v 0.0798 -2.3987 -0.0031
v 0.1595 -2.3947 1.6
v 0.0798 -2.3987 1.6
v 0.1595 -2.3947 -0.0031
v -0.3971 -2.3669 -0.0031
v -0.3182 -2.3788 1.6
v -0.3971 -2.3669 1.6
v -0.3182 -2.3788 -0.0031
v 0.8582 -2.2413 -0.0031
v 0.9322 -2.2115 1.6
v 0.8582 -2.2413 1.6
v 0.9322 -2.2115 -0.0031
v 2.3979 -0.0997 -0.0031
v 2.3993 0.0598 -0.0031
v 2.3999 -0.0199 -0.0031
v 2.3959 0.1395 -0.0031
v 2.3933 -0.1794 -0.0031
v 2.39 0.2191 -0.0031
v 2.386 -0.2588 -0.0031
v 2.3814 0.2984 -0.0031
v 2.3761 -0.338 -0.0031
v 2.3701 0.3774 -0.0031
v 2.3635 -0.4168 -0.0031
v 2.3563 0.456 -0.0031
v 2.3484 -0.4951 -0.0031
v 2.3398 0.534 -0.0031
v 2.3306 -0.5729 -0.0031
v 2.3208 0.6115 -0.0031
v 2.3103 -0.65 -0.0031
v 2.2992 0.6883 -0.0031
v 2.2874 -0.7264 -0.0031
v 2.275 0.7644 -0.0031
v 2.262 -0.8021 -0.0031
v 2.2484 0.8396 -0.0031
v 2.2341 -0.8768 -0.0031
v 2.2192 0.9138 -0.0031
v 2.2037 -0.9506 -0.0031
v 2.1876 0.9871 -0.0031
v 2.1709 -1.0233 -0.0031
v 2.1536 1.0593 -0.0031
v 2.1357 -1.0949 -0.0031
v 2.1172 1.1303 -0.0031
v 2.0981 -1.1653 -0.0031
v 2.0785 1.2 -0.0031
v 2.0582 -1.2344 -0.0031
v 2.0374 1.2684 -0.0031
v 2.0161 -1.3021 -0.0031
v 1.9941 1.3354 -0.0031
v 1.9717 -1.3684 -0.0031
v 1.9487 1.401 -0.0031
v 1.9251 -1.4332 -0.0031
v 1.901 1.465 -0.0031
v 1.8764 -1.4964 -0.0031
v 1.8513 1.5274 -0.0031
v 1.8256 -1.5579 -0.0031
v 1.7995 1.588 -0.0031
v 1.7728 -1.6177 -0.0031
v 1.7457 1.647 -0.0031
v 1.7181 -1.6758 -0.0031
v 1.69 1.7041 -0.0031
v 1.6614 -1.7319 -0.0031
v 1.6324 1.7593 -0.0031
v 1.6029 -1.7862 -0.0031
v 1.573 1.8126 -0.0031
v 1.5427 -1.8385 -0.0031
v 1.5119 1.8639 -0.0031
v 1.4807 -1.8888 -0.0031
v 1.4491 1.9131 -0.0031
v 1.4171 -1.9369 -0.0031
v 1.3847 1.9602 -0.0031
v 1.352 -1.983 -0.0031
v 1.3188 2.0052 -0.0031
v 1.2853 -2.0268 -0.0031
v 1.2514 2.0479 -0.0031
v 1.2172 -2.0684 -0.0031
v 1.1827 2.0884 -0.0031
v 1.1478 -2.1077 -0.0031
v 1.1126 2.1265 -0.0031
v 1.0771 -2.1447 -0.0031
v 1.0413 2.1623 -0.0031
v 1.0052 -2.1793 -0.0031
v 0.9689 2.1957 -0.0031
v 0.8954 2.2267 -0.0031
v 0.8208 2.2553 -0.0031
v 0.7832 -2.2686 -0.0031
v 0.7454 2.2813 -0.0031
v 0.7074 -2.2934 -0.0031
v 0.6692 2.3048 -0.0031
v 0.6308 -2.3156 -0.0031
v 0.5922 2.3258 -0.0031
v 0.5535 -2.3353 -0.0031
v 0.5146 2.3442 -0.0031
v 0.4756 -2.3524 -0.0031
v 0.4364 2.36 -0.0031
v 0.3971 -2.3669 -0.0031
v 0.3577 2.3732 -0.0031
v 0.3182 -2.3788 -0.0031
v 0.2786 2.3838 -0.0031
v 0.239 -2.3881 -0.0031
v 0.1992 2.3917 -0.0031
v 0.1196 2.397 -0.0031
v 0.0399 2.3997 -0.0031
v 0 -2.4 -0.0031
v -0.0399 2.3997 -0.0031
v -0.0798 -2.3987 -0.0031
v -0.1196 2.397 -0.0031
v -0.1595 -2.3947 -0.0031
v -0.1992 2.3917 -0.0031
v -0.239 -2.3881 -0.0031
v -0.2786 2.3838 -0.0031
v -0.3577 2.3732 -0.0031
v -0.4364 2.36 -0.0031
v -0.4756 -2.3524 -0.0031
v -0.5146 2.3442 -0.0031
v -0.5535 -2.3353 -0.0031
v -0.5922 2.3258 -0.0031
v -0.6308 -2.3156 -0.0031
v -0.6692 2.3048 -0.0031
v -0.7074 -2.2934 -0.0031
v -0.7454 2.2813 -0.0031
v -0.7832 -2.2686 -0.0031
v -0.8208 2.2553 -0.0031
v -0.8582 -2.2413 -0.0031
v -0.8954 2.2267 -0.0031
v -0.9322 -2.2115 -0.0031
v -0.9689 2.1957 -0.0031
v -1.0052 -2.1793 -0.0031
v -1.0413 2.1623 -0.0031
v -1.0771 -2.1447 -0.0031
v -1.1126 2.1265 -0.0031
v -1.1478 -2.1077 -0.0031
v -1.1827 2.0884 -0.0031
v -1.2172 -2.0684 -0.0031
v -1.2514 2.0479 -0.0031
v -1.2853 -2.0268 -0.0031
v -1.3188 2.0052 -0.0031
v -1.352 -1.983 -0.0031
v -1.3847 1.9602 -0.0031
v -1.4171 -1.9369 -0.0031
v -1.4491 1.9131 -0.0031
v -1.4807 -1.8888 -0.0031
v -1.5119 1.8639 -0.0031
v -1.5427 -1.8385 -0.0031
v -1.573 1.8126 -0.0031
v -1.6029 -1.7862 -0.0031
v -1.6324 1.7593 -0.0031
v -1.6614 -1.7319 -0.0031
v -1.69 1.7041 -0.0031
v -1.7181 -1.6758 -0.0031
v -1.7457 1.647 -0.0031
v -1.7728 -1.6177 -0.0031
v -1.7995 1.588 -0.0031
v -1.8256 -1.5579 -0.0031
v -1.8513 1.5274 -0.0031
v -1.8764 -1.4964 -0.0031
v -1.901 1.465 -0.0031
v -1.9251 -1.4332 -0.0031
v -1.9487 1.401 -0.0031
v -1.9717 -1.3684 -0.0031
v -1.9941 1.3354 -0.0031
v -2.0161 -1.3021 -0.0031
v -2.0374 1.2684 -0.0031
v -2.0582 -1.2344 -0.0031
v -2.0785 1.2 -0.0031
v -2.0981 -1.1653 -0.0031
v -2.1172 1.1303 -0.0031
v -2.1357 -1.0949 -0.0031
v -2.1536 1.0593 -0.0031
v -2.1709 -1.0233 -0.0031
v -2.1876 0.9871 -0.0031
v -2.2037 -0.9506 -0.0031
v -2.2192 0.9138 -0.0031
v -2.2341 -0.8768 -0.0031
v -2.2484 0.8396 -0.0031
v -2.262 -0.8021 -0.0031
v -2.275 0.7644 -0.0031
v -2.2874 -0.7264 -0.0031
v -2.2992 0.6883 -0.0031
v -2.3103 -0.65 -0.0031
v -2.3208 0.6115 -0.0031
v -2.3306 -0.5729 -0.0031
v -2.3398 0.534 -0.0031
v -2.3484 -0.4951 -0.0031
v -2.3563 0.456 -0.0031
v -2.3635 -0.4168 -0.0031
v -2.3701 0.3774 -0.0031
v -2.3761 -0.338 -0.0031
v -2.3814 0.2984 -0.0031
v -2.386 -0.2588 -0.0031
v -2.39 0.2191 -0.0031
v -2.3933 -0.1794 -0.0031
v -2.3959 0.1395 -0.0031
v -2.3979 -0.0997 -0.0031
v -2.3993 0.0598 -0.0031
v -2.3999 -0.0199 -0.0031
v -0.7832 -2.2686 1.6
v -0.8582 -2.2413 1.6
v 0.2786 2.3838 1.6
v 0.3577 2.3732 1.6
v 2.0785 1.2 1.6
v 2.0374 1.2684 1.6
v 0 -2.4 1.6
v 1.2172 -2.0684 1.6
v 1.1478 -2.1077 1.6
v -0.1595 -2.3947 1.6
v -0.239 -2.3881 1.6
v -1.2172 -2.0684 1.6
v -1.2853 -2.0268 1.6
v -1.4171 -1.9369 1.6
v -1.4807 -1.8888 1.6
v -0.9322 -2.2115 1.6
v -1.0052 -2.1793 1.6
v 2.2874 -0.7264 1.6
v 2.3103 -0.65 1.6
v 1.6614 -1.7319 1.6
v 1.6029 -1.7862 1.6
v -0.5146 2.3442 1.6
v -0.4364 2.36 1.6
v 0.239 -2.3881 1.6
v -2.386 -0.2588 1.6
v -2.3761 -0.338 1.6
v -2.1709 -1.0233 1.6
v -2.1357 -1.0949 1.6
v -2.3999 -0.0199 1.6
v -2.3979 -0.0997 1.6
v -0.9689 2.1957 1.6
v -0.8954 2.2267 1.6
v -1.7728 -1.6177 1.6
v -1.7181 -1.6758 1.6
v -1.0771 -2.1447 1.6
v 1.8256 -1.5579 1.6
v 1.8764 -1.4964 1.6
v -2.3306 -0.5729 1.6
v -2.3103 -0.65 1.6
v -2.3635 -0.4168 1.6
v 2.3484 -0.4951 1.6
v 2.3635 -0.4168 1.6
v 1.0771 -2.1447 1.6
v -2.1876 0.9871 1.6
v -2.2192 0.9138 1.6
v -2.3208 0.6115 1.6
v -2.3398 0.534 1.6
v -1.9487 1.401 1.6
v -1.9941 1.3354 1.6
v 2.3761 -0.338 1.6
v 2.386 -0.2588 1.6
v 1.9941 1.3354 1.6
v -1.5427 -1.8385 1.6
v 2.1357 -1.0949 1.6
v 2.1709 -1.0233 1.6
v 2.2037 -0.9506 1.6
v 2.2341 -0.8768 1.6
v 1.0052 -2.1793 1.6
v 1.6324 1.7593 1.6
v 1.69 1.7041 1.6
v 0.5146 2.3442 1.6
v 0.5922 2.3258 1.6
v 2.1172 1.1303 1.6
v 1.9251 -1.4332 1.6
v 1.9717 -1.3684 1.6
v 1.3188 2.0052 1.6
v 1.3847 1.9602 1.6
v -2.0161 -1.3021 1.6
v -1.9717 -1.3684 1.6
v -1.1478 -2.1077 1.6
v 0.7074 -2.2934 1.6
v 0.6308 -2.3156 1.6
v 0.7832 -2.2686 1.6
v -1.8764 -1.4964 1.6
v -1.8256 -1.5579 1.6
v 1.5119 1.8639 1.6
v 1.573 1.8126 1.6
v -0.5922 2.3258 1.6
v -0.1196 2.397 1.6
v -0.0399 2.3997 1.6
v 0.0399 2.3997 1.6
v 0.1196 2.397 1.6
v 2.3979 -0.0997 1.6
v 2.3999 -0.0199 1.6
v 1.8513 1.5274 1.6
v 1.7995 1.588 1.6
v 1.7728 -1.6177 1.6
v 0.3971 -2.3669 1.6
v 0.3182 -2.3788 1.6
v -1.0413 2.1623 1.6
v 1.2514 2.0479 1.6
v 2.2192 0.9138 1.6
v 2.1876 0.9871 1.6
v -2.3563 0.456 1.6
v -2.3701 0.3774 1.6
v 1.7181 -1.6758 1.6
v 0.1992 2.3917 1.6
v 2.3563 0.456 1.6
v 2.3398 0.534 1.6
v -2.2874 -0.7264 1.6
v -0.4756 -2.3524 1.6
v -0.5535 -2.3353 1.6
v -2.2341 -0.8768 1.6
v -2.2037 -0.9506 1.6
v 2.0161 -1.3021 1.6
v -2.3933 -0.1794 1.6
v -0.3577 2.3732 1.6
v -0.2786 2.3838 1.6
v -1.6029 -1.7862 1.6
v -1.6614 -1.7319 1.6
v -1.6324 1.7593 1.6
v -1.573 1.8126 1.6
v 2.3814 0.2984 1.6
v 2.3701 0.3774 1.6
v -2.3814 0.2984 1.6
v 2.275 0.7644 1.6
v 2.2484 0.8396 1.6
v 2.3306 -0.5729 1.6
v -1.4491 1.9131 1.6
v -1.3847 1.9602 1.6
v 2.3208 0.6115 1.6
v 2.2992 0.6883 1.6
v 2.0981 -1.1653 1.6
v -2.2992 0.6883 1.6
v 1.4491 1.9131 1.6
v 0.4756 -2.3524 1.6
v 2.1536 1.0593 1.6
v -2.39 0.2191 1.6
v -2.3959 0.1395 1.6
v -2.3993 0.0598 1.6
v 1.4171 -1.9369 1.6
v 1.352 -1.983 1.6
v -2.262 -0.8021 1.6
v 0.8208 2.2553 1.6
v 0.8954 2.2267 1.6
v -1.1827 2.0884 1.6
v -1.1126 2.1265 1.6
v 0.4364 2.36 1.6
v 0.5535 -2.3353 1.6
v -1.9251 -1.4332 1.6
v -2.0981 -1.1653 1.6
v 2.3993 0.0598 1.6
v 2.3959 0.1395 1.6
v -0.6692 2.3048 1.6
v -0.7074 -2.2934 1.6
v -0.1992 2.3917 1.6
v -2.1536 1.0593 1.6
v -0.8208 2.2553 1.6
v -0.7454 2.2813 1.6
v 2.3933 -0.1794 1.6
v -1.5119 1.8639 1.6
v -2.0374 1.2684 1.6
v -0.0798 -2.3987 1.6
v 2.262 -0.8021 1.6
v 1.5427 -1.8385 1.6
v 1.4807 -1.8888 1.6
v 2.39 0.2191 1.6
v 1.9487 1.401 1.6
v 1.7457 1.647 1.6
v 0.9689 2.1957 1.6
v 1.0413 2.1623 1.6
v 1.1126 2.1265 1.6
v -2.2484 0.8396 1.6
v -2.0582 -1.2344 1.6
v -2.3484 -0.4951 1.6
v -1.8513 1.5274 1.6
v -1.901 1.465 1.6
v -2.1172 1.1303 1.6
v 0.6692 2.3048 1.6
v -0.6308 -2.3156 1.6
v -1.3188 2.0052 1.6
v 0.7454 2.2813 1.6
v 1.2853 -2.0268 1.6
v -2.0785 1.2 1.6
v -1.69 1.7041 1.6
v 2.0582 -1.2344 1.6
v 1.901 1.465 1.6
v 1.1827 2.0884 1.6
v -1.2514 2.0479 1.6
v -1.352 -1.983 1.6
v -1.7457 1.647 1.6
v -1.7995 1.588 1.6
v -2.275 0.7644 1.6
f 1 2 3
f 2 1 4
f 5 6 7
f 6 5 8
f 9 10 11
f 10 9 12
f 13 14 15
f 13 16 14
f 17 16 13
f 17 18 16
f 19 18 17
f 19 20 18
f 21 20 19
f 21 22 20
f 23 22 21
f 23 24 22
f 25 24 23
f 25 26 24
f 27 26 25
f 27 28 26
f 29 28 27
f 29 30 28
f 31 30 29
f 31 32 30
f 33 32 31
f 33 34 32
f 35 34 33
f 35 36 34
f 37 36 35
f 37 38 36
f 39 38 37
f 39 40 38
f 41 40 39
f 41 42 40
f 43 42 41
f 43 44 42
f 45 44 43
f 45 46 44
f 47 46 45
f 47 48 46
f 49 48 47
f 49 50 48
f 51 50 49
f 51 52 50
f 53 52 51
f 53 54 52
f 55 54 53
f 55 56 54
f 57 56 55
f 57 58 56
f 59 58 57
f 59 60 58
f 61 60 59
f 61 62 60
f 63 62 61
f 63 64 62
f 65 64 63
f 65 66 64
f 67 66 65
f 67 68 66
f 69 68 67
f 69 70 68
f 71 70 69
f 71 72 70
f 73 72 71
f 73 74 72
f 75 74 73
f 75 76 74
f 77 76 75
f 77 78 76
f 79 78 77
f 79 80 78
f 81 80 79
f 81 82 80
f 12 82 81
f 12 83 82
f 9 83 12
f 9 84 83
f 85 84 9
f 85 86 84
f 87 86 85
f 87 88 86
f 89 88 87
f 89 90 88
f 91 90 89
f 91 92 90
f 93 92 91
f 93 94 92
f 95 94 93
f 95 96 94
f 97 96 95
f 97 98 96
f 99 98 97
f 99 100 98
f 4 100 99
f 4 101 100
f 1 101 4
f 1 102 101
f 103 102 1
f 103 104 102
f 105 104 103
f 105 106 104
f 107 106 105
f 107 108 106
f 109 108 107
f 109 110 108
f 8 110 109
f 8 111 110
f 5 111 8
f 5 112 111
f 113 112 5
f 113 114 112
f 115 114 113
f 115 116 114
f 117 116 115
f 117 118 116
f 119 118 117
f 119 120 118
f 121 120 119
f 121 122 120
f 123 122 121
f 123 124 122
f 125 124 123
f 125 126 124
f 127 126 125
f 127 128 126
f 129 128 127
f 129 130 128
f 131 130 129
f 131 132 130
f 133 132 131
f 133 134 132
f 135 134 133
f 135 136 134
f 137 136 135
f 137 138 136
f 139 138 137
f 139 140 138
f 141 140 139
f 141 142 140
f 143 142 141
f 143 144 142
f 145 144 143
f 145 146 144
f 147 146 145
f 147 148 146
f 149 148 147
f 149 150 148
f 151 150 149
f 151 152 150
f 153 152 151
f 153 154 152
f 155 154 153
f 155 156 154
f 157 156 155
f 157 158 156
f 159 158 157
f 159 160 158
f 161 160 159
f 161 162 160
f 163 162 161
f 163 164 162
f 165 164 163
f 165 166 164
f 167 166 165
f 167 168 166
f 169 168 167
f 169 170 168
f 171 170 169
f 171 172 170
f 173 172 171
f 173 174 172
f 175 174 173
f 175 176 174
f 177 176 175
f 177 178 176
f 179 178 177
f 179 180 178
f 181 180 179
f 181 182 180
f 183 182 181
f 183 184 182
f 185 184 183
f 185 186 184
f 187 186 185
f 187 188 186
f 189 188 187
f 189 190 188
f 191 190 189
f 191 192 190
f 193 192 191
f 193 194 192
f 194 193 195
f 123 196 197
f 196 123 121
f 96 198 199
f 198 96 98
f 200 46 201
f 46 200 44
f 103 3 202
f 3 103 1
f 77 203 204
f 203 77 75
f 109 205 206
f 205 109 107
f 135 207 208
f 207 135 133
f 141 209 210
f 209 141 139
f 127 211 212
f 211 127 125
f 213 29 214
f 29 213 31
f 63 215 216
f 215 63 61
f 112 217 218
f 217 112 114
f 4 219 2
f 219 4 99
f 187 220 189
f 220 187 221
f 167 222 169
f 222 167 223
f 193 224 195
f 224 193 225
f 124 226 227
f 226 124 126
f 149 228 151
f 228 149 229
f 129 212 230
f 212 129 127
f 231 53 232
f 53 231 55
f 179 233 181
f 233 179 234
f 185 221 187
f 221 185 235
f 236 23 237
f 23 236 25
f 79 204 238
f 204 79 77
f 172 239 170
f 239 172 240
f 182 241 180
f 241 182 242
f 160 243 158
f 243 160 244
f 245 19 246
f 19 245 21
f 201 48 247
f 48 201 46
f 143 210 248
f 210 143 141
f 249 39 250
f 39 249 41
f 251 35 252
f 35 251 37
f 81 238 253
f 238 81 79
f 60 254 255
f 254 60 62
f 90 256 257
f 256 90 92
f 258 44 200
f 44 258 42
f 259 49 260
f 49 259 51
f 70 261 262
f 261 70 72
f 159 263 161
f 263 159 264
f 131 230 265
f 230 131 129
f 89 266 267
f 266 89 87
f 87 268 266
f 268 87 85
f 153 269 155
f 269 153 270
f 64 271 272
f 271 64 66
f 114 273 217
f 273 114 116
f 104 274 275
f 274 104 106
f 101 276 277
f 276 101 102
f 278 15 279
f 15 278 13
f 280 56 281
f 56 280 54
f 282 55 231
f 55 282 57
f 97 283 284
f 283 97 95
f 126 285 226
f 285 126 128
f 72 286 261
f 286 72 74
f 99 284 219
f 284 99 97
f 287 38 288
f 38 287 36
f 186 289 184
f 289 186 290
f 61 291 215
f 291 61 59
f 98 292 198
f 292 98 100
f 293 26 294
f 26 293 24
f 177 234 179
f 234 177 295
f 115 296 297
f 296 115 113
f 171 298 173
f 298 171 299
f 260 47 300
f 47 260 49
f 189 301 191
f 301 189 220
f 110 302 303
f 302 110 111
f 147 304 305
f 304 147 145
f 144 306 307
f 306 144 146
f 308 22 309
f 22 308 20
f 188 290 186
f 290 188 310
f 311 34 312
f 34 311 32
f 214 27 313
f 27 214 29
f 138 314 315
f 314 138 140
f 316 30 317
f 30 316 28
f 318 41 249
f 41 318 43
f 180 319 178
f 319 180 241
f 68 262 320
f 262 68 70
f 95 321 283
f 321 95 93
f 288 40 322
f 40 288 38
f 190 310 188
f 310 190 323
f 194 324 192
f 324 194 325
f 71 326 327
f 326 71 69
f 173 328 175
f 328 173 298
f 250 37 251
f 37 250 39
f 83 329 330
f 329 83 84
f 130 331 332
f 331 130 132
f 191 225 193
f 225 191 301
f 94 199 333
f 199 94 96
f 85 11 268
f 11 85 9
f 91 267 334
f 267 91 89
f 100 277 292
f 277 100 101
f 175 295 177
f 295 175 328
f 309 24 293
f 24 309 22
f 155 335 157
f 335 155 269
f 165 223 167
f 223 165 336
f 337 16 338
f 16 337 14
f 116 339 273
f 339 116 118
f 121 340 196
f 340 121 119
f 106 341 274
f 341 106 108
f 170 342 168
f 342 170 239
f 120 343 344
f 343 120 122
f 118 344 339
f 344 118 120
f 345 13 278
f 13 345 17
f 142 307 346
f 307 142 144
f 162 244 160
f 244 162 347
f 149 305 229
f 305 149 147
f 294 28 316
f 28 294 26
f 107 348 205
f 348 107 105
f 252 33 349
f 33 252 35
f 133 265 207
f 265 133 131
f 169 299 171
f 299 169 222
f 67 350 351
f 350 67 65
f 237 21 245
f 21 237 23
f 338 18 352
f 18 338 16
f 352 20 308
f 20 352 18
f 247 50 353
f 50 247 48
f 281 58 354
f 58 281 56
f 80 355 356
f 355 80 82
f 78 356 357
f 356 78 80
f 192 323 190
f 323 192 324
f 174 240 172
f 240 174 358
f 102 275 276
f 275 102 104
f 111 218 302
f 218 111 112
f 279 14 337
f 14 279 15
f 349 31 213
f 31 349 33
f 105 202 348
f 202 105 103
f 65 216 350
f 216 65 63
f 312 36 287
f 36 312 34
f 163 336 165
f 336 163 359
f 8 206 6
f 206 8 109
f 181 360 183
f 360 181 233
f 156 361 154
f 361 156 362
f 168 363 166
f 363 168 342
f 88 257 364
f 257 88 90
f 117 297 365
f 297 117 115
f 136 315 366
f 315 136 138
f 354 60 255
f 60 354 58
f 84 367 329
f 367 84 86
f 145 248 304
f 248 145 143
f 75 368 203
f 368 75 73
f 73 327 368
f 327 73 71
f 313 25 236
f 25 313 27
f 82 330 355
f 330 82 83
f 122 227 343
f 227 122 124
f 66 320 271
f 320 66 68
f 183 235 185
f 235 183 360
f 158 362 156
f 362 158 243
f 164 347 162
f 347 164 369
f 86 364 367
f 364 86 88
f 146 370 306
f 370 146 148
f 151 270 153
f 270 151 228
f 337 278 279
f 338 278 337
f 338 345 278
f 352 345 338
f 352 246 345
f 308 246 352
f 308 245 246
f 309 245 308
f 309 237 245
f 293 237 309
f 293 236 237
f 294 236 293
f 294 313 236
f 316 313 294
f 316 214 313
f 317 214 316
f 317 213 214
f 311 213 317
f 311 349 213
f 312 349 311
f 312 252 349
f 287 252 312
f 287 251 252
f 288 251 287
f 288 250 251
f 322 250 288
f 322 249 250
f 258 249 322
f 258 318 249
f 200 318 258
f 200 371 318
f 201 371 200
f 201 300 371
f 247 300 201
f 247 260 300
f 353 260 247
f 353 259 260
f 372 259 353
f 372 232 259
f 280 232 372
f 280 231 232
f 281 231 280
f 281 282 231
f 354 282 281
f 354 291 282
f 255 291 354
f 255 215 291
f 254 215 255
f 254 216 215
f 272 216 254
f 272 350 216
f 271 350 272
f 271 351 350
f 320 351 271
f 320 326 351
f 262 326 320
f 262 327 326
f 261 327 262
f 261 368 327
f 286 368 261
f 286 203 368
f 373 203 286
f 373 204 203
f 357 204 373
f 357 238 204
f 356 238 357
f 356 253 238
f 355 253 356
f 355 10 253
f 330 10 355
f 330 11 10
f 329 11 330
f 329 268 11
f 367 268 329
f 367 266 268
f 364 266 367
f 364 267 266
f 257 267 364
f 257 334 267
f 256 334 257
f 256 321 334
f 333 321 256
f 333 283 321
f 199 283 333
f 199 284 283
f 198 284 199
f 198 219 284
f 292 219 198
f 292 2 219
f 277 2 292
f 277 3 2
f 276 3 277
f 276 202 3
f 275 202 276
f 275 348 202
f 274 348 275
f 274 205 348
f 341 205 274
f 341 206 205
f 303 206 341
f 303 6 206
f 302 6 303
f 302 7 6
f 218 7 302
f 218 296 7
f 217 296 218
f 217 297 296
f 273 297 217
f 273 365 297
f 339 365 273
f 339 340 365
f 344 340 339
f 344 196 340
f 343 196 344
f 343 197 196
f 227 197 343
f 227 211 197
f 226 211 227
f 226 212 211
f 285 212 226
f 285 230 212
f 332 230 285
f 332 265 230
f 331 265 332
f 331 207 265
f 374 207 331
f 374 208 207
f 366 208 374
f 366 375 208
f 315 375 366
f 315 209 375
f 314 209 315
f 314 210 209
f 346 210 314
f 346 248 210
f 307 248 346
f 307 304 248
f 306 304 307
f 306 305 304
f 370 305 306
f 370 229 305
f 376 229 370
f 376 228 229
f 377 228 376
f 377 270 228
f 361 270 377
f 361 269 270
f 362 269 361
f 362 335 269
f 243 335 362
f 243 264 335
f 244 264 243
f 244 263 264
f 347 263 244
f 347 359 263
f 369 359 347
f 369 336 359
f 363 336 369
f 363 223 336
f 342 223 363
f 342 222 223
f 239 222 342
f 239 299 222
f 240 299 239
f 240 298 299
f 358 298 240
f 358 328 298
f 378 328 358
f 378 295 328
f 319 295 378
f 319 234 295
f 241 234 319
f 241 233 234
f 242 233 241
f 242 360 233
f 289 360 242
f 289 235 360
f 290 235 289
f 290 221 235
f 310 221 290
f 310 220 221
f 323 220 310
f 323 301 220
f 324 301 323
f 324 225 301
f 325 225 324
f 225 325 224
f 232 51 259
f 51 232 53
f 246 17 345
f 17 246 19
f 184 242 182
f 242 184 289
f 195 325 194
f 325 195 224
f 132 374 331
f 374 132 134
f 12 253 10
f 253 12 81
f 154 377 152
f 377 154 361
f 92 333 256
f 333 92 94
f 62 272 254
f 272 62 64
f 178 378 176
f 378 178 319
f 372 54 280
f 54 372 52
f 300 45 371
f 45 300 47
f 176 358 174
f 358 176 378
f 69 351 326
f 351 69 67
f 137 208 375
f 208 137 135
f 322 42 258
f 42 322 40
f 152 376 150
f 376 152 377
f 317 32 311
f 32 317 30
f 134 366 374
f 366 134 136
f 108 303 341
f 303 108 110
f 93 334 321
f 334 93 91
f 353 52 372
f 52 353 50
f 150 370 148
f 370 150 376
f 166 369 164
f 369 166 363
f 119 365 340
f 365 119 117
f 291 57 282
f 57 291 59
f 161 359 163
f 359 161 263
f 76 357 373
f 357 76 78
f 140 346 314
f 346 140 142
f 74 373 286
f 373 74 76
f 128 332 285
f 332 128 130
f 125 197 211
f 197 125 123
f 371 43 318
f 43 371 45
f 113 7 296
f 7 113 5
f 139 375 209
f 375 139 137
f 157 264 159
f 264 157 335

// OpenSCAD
use <../lib.scad>
use <../p/4-4disc.scad>
use <s/4728s02.scad>
use <../p/stud.scad>
$fa=1; $fs=0.2;
function ldraw_lib__98262(realsolid=false) = [
// 0 Plant Flower  2 x  2 with Solid Stud
// 0 Name: 98262.dat
// 0 Author: Sylvain Sauvage [SLS]
// 0 !LDRAW_ORG Part UPDATE 2017-01
// 0 !LICENSE Licensed under CC BY 2.0 and CC BY 4.0 : see CAreadme.txt
// 
// 0 BFC CERTIFY CCW
  [0,"BFC","CERTIFY"],
  [0,"BFC","CCW"],
// 
// 0 !HISTORY 2017-12-30 [PTadmin] Official Update 2017-01
// 
// 
// 1 16 0 0 0 1 0 0 0 1 0 0 0 1 s\4728s02.dat
  [1,16,0,0,0,1,0,0,0,1,0,0,0,1, ldraw_lib__s__4728s02(realsolid)],
// 1 16 0 0 0 1 0 0 0 1 0 0 0 1 stud.dat
  [1,16,0,0,0,1,0,0,0,1,0,0,0,1, ldraw_lib__stud(realsolid)],
// 1 16 0 4 0 6 0 0 0 -1 0 0 0 6 4-4disc.dat
  [1,16,0,4,0,6,0,0,0,-1,0,0,0,6, ldraw_lib__4_4disc(realsolid)],
];
module ldraw_lib__98262(step=0, col=false, unit=2/5, alt=false, line=0.2, solid=!$preview)
    makepoly(ldraw_lib__98262(solid), step=step, col=col, unit=unit, alt=alt, line=line, solid=solid);
ldraw_lib__98262(line=0.2);
